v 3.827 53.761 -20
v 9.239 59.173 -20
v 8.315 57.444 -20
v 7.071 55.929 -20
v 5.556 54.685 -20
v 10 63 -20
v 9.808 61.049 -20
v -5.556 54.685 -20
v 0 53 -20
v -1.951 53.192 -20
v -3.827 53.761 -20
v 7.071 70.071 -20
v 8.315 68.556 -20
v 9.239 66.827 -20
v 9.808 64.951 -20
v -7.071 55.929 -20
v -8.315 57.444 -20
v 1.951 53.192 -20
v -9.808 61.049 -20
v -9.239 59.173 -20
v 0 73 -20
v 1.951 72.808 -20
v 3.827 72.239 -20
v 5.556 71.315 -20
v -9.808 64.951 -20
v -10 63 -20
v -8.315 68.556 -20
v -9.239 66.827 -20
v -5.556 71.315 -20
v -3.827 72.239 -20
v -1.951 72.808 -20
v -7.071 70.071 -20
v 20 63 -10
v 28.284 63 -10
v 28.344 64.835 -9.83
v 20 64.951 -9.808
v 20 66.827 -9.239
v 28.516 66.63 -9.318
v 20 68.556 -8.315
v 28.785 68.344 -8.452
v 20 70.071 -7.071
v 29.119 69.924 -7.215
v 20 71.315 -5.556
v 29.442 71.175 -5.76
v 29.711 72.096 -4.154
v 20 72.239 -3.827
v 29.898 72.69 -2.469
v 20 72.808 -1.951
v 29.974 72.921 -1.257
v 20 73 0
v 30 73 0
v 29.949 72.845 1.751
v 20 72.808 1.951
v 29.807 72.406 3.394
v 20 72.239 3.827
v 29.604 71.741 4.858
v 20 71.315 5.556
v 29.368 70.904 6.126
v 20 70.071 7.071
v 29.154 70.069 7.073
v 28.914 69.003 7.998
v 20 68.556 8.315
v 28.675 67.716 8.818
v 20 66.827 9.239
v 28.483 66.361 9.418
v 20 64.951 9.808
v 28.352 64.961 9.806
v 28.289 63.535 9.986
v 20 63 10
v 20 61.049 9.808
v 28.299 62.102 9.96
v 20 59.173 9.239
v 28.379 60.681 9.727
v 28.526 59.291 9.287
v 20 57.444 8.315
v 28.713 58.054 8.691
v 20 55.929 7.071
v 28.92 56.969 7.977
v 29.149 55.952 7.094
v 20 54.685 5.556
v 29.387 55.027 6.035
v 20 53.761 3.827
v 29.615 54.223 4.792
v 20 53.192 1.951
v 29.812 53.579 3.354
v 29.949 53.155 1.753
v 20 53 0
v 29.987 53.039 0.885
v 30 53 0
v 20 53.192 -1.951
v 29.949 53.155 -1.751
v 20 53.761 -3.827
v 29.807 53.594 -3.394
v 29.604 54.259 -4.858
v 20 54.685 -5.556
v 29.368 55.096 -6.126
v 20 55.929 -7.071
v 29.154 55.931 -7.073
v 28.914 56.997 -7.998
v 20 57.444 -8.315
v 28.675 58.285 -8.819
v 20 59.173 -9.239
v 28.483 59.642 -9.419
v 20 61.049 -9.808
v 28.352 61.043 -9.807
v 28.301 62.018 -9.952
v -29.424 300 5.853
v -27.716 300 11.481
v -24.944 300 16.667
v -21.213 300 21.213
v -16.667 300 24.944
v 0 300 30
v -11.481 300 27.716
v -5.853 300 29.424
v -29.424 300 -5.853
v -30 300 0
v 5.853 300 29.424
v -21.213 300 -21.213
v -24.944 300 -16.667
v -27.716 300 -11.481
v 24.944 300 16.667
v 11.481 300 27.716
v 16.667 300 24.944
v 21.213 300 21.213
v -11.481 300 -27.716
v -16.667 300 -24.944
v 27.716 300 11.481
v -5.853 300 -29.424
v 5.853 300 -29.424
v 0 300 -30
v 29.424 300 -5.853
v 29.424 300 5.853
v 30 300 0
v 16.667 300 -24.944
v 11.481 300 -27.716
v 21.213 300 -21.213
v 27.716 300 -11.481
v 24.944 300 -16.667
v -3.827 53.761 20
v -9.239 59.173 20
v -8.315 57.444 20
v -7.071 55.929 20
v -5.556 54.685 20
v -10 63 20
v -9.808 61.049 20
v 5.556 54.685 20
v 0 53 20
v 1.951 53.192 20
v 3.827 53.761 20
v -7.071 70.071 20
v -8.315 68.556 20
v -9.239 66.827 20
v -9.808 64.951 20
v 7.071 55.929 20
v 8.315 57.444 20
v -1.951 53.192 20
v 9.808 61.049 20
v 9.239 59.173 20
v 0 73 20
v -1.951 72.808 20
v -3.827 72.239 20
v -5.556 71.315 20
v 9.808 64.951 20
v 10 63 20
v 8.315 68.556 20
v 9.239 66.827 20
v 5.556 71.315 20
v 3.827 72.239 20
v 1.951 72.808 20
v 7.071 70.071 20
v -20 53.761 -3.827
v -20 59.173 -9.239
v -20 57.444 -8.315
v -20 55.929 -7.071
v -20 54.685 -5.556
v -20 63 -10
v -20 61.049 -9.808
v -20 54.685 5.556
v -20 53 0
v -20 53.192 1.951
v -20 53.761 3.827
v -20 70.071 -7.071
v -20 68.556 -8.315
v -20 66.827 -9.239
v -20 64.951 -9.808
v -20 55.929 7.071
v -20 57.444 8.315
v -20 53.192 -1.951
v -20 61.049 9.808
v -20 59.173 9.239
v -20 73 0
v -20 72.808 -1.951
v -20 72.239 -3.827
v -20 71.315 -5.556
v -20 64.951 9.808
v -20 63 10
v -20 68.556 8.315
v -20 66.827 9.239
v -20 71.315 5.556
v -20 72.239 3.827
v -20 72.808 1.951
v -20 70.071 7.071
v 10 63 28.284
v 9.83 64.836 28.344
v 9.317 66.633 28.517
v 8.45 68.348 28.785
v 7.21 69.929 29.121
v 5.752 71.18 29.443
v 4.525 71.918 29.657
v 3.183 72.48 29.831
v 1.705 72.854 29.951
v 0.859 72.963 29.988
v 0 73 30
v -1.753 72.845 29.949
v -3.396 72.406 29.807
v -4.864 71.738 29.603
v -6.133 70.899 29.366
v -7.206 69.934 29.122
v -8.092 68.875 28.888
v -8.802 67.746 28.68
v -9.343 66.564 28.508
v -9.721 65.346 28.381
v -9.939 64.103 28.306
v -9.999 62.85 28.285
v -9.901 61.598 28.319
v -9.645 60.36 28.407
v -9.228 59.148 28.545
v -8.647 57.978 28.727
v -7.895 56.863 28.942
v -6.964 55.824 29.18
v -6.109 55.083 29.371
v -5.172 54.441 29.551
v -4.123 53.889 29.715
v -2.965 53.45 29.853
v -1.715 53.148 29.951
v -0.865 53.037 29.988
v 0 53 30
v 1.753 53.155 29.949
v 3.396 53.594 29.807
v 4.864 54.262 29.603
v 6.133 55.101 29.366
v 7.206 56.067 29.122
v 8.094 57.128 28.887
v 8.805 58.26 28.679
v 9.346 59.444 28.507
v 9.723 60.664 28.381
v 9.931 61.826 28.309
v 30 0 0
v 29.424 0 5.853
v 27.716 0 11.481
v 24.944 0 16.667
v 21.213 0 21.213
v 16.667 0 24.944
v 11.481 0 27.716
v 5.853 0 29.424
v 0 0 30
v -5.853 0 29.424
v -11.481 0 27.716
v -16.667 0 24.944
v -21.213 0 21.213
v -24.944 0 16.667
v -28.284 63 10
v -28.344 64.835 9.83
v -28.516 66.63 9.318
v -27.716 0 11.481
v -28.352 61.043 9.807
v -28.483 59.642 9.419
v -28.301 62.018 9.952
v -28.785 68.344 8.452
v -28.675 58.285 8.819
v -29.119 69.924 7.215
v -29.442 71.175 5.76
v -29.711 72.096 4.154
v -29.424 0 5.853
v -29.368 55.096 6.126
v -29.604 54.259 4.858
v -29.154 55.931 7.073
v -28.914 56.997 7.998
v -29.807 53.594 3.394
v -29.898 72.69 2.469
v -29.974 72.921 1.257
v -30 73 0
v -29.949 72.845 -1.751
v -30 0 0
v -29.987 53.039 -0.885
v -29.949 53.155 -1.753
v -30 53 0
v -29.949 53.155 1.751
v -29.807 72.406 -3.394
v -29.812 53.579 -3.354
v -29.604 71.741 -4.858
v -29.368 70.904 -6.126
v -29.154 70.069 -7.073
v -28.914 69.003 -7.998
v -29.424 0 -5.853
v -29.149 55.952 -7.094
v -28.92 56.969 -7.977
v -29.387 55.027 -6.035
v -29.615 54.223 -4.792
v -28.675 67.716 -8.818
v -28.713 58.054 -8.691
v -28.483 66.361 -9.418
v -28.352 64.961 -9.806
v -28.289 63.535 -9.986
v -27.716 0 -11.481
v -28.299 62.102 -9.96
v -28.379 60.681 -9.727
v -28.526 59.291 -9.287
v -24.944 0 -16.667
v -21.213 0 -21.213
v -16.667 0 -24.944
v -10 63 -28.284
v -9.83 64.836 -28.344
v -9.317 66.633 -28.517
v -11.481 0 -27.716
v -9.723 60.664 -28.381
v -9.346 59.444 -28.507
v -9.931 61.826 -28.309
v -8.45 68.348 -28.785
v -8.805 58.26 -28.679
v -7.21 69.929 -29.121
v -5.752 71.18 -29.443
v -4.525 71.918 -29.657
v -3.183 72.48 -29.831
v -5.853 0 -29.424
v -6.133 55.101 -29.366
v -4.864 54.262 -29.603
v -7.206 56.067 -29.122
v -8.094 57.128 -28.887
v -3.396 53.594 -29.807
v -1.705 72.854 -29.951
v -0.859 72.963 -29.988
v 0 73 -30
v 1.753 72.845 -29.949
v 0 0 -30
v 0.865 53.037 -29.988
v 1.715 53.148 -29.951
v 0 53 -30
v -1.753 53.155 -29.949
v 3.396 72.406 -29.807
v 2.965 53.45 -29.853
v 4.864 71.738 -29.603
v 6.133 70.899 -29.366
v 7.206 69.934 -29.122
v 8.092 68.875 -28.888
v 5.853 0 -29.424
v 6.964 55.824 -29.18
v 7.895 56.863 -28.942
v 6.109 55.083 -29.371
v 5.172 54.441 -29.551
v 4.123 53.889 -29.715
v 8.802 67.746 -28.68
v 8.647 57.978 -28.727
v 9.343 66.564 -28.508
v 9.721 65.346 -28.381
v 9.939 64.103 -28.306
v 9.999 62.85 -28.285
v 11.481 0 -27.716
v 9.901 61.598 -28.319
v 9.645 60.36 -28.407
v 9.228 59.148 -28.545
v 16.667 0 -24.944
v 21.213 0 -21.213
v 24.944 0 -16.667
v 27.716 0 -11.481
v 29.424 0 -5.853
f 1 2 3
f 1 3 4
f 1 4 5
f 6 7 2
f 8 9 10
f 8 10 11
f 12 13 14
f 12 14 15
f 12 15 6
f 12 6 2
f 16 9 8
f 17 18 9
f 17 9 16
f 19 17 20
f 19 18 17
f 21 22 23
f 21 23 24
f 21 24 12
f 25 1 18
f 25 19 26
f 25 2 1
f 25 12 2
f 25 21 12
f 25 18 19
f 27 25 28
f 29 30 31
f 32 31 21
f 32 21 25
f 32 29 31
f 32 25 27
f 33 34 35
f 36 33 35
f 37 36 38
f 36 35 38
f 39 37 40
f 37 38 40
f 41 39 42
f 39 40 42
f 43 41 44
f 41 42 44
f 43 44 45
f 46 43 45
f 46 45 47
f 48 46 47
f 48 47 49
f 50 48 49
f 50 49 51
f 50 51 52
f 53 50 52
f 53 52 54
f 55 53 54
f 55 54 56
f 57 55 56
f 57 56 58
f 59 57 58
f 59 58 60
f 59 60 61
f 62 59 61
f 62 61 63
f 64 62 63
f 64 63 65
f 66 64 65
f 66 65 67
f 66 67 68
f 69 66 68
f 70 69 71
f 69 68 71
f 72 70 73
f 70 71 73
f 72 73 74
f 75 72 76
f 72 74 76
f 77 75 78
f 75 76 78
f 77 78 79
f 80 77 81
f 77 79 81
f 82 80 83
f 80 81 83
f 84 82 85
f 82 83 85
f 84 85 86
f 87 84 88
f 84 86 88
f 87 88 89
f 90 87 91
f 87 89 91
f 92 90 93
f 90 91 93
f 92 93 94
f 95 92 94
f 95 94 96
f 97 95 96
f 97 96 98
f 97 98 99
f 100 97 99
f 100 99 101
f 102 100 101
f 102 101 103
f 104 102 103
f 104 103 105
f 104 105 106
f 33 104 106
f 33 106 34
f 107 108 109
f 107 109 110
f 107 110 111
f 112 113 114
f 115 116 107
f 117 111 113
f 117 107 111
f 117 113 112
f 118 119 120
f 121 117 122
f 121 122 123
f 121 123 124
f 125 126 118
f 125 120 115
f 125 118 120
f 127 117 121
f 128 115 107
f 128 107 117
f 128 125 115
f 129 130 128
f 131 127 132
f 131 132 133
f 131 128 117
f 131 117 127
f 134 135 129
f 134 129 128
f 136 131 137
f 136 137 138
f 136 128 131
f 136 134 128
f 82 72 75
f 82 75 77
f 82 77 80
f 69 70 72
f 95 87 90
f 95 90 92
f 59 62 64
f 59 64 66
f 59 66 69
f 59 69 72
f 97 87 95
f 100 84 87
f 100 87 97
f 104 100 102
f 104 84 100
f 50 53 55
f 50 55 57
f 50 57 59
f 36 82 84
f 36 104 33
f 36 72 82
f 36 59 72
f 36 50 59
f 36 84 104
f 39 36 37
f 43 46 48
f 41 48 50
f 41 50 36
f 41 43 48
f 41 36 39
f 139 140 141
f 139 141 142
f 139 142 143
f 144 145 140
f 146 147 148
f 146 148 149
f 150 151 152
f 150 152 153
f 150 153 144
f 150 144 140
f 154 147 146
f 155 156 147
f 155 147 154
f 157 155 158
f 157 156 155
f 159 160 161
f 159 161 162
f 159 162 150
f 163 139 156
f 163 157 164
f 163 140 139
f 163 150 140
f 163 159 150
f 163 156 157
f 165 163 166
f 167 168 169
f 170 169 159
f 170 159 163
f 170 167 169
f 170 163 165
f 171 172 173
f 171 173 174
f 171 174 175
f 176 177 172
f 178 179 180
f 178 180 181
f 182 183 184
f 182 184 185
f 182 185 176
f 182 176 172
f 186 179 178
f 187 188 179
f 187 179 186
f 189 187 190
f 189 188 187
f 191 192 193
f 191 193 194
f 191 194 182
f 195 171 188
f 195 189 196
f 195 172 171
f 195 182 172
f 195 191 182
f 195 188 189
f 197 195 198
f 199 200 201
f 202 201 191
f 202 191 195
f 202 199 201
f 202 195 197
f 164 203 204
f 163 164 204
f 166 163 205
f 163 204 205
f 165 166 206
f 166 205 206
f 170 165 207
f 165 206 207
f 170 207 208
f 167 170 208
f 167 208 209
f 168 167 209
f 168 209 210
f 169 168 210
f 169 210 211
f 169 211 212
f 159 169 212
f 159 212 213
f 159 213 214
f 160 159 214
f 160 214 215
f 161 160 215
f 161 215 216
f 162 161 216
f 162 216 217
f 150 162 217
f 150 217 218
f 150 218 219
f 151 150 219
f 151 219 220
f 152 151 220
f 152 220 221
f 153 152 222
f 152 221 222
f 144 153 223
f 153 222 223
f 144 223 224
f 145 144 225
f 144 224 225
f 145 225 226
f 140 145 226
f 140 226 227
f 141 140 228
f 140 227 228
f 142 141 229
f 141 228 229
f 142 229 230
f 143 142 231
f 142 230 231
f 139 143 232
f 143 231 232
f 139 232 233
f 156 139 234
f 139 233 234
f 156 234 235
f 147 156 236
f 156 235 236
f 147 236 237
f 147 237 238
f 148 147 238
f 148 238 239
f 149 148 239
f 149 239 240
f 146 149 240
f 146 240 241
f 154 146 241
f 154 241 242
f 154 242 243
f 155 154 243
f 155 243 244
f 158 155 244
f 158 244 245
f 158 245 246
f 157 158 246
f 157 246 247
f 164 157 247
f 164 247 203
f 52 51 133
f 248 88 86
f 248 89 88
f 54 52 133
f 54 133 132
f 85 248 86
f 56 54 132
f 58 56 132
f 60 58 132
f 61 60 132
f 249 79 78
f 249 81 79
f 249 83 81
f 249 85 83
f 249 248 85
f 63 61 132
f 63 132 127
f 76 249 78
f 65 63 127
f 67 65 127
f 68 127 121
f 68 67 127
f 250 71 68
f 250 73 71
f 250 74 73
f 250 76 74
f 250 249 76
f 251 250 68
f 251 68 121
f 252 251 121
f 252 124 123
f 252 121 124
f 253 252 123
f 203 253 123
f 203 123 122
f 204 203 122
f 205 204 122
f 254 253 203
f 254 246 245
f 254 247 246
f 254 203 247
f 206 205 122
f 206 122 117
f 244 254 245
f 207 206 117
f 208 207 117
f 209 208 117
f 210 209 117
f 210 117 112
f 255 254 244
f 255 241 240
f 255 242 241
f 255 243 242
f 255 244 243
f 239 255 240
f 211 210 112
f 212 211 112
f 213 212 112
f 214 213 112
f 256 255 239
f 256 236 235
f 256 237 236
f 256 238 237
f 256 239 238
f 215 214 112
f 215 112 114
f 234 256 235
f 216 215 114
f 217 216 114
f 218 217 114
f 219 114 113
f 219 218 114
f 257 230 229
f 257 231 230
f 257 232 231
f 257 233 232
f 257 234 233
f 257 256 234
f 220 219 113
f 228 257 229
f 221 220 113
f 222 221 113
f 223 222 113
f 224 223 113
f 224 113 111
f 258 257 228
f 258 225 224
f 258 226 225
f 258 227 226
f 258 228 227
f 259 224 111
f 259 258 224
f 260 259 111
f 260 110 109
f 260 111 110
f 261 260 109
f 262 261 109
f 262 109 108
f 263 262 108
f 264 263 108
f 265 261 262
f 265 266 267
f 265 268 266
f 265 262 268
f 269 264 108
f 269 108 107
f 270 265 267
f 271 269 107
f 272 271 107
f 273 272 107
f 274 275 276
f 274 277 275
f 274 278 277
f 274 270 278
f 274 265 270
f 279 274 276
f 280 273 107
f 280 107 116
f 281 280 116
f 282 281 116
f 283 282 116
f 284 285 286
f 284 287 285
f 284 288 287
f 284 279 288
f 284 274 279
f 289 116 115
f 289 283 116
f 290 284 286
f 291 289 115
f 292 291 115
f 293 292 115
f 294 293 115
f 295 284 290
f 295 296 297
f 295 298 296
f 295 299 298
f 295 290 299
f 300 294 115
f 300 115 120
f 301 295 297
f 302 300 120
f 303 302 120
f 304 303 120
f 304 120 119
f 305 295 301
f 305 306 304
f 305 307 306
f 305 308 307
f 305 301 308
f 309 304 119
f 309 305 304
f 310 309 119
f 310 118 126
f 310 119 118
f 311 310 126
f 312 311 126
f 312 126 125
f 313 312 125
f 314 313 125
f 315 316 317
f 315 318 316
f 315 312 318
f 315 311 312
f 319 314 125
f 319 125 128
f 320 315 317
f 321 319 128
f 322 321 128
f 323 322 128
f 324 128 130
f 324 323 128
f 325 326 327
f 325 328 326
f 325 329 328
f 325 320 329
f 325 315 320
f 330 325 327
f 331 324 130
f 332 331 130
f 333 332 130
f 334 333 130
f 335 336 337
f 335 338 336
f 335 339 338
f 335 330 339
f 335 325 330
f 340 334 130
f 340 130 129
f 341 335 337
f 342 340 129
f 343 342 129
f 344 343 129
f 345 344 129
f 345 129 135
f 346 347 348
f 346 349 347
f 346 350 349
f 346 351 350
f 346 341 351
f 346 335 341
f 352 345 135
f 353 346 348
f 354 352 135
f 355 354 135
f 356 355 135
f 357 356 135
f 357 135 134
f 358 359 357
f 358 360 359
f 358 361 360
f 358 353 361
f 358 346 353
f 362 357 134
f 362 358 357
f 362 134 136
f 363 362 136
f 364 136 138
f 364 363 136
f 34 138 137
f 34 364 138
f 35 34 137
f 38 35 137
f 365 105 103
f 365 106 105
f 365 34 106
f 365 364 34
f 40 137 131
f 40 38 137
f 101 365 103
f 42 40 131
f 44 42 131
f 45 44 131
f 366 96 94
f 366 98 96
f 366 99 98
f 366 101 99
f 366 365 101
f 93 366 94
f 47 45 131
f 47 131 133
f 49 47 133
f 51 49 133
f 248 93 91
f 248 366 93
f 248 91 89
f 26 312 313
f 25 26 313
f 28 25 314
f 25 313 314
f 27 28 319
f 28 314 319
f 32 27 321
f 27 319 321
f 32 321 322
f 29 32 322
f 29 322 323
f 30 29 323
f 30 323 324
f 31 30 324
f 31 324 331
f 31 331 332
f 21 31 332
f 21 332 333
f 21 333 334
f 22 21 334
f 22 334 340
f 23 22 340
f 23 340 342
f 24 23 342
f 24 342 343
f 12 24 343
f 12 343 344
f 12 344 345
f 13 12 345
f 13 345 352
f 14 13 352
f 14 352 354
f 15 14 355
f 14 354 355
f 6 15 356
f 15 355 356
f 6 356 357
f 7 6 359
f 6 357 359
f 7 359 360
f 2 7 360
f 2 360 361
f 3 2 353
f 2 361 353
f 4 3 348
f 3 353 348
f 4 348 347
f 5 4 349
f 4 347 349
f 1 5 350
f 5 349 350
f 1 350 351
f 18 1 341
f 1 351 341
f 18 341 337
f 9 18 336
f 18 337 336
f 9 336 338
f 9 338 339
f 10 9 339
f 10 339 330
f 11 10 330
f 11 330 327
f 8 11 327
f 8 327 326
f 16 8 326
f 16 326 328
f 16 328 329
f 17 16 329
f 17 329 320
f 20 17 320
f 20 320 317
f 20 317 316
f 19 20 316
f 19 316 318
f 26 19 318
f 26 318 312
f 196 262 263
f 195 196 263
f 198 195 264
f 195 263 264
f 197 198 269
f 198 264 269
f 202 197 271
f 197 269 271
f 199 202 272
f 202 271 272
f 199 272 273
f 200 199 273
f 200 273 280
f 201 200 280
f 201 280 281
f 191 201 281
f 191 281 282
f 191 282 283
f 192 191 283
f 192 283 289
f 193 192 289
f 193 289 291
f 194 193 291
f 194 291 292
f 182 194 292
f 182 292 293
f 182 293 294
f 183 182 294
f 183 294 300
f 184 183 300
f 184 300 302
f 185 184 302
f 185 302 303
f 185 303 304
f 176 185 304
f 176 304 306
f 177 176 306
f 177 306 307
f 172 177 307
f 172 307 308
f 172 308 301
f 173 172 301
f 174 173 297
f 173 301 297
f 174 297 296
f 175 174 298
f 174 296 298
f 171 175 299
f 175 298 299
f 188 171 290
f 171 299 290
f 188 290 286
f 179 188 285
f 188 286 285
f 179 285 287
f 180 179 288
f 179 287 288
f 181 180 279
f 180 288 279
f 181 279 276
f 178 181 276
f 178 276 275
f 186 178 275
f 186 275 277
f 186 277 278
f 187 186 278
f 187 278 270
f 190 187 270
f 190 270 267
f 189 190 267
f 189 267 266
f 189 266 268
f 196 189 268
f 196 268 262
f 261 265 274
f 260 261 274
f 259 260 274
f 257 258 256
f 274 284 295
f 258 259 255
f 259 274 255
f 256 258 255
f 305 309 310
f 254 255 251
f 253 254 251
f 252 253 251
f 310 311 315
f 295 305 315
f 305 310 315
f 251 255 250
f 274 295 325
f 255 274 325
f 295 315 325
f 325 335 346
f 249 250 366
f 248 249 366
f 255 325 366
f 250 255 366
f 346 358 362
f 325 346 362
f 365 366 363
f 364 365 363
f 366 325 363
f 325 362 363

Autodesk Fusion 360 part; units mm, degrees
sketch "Sketch1" plane through (0, 0, 0) normal (0, 1, 0) x (1, 0, 0)
  circle A0 centre (0, 0) radius 30
  dimension "d1" = 60
extrude "Extrude1" add sketch "Sketch1" along normal blind 300
ref_plane "WorkPlane2" through (0, 0, 30) normal (0, 0, 1) x (1, 0, 0)
sketch "Sketch5" plane through (0, 0, 30) normal (0, 0, 1) x (1, 0, 0)
  circle A0 centre (0, 63) radius 10
  dimension "d16" = 63
  dimension "d17" = 20
extrude "Extrude5" cut sketch "Sketch5" against normal blind 10
pattern_circular "C-Pattern2" count 4 over 360 about axis through (0, 1.75, 0) along (0, 1, 0) of "Extrude5"
thread "Thread1"
thread "Thread2"
thread "Thread3"
thread "Thread4"
